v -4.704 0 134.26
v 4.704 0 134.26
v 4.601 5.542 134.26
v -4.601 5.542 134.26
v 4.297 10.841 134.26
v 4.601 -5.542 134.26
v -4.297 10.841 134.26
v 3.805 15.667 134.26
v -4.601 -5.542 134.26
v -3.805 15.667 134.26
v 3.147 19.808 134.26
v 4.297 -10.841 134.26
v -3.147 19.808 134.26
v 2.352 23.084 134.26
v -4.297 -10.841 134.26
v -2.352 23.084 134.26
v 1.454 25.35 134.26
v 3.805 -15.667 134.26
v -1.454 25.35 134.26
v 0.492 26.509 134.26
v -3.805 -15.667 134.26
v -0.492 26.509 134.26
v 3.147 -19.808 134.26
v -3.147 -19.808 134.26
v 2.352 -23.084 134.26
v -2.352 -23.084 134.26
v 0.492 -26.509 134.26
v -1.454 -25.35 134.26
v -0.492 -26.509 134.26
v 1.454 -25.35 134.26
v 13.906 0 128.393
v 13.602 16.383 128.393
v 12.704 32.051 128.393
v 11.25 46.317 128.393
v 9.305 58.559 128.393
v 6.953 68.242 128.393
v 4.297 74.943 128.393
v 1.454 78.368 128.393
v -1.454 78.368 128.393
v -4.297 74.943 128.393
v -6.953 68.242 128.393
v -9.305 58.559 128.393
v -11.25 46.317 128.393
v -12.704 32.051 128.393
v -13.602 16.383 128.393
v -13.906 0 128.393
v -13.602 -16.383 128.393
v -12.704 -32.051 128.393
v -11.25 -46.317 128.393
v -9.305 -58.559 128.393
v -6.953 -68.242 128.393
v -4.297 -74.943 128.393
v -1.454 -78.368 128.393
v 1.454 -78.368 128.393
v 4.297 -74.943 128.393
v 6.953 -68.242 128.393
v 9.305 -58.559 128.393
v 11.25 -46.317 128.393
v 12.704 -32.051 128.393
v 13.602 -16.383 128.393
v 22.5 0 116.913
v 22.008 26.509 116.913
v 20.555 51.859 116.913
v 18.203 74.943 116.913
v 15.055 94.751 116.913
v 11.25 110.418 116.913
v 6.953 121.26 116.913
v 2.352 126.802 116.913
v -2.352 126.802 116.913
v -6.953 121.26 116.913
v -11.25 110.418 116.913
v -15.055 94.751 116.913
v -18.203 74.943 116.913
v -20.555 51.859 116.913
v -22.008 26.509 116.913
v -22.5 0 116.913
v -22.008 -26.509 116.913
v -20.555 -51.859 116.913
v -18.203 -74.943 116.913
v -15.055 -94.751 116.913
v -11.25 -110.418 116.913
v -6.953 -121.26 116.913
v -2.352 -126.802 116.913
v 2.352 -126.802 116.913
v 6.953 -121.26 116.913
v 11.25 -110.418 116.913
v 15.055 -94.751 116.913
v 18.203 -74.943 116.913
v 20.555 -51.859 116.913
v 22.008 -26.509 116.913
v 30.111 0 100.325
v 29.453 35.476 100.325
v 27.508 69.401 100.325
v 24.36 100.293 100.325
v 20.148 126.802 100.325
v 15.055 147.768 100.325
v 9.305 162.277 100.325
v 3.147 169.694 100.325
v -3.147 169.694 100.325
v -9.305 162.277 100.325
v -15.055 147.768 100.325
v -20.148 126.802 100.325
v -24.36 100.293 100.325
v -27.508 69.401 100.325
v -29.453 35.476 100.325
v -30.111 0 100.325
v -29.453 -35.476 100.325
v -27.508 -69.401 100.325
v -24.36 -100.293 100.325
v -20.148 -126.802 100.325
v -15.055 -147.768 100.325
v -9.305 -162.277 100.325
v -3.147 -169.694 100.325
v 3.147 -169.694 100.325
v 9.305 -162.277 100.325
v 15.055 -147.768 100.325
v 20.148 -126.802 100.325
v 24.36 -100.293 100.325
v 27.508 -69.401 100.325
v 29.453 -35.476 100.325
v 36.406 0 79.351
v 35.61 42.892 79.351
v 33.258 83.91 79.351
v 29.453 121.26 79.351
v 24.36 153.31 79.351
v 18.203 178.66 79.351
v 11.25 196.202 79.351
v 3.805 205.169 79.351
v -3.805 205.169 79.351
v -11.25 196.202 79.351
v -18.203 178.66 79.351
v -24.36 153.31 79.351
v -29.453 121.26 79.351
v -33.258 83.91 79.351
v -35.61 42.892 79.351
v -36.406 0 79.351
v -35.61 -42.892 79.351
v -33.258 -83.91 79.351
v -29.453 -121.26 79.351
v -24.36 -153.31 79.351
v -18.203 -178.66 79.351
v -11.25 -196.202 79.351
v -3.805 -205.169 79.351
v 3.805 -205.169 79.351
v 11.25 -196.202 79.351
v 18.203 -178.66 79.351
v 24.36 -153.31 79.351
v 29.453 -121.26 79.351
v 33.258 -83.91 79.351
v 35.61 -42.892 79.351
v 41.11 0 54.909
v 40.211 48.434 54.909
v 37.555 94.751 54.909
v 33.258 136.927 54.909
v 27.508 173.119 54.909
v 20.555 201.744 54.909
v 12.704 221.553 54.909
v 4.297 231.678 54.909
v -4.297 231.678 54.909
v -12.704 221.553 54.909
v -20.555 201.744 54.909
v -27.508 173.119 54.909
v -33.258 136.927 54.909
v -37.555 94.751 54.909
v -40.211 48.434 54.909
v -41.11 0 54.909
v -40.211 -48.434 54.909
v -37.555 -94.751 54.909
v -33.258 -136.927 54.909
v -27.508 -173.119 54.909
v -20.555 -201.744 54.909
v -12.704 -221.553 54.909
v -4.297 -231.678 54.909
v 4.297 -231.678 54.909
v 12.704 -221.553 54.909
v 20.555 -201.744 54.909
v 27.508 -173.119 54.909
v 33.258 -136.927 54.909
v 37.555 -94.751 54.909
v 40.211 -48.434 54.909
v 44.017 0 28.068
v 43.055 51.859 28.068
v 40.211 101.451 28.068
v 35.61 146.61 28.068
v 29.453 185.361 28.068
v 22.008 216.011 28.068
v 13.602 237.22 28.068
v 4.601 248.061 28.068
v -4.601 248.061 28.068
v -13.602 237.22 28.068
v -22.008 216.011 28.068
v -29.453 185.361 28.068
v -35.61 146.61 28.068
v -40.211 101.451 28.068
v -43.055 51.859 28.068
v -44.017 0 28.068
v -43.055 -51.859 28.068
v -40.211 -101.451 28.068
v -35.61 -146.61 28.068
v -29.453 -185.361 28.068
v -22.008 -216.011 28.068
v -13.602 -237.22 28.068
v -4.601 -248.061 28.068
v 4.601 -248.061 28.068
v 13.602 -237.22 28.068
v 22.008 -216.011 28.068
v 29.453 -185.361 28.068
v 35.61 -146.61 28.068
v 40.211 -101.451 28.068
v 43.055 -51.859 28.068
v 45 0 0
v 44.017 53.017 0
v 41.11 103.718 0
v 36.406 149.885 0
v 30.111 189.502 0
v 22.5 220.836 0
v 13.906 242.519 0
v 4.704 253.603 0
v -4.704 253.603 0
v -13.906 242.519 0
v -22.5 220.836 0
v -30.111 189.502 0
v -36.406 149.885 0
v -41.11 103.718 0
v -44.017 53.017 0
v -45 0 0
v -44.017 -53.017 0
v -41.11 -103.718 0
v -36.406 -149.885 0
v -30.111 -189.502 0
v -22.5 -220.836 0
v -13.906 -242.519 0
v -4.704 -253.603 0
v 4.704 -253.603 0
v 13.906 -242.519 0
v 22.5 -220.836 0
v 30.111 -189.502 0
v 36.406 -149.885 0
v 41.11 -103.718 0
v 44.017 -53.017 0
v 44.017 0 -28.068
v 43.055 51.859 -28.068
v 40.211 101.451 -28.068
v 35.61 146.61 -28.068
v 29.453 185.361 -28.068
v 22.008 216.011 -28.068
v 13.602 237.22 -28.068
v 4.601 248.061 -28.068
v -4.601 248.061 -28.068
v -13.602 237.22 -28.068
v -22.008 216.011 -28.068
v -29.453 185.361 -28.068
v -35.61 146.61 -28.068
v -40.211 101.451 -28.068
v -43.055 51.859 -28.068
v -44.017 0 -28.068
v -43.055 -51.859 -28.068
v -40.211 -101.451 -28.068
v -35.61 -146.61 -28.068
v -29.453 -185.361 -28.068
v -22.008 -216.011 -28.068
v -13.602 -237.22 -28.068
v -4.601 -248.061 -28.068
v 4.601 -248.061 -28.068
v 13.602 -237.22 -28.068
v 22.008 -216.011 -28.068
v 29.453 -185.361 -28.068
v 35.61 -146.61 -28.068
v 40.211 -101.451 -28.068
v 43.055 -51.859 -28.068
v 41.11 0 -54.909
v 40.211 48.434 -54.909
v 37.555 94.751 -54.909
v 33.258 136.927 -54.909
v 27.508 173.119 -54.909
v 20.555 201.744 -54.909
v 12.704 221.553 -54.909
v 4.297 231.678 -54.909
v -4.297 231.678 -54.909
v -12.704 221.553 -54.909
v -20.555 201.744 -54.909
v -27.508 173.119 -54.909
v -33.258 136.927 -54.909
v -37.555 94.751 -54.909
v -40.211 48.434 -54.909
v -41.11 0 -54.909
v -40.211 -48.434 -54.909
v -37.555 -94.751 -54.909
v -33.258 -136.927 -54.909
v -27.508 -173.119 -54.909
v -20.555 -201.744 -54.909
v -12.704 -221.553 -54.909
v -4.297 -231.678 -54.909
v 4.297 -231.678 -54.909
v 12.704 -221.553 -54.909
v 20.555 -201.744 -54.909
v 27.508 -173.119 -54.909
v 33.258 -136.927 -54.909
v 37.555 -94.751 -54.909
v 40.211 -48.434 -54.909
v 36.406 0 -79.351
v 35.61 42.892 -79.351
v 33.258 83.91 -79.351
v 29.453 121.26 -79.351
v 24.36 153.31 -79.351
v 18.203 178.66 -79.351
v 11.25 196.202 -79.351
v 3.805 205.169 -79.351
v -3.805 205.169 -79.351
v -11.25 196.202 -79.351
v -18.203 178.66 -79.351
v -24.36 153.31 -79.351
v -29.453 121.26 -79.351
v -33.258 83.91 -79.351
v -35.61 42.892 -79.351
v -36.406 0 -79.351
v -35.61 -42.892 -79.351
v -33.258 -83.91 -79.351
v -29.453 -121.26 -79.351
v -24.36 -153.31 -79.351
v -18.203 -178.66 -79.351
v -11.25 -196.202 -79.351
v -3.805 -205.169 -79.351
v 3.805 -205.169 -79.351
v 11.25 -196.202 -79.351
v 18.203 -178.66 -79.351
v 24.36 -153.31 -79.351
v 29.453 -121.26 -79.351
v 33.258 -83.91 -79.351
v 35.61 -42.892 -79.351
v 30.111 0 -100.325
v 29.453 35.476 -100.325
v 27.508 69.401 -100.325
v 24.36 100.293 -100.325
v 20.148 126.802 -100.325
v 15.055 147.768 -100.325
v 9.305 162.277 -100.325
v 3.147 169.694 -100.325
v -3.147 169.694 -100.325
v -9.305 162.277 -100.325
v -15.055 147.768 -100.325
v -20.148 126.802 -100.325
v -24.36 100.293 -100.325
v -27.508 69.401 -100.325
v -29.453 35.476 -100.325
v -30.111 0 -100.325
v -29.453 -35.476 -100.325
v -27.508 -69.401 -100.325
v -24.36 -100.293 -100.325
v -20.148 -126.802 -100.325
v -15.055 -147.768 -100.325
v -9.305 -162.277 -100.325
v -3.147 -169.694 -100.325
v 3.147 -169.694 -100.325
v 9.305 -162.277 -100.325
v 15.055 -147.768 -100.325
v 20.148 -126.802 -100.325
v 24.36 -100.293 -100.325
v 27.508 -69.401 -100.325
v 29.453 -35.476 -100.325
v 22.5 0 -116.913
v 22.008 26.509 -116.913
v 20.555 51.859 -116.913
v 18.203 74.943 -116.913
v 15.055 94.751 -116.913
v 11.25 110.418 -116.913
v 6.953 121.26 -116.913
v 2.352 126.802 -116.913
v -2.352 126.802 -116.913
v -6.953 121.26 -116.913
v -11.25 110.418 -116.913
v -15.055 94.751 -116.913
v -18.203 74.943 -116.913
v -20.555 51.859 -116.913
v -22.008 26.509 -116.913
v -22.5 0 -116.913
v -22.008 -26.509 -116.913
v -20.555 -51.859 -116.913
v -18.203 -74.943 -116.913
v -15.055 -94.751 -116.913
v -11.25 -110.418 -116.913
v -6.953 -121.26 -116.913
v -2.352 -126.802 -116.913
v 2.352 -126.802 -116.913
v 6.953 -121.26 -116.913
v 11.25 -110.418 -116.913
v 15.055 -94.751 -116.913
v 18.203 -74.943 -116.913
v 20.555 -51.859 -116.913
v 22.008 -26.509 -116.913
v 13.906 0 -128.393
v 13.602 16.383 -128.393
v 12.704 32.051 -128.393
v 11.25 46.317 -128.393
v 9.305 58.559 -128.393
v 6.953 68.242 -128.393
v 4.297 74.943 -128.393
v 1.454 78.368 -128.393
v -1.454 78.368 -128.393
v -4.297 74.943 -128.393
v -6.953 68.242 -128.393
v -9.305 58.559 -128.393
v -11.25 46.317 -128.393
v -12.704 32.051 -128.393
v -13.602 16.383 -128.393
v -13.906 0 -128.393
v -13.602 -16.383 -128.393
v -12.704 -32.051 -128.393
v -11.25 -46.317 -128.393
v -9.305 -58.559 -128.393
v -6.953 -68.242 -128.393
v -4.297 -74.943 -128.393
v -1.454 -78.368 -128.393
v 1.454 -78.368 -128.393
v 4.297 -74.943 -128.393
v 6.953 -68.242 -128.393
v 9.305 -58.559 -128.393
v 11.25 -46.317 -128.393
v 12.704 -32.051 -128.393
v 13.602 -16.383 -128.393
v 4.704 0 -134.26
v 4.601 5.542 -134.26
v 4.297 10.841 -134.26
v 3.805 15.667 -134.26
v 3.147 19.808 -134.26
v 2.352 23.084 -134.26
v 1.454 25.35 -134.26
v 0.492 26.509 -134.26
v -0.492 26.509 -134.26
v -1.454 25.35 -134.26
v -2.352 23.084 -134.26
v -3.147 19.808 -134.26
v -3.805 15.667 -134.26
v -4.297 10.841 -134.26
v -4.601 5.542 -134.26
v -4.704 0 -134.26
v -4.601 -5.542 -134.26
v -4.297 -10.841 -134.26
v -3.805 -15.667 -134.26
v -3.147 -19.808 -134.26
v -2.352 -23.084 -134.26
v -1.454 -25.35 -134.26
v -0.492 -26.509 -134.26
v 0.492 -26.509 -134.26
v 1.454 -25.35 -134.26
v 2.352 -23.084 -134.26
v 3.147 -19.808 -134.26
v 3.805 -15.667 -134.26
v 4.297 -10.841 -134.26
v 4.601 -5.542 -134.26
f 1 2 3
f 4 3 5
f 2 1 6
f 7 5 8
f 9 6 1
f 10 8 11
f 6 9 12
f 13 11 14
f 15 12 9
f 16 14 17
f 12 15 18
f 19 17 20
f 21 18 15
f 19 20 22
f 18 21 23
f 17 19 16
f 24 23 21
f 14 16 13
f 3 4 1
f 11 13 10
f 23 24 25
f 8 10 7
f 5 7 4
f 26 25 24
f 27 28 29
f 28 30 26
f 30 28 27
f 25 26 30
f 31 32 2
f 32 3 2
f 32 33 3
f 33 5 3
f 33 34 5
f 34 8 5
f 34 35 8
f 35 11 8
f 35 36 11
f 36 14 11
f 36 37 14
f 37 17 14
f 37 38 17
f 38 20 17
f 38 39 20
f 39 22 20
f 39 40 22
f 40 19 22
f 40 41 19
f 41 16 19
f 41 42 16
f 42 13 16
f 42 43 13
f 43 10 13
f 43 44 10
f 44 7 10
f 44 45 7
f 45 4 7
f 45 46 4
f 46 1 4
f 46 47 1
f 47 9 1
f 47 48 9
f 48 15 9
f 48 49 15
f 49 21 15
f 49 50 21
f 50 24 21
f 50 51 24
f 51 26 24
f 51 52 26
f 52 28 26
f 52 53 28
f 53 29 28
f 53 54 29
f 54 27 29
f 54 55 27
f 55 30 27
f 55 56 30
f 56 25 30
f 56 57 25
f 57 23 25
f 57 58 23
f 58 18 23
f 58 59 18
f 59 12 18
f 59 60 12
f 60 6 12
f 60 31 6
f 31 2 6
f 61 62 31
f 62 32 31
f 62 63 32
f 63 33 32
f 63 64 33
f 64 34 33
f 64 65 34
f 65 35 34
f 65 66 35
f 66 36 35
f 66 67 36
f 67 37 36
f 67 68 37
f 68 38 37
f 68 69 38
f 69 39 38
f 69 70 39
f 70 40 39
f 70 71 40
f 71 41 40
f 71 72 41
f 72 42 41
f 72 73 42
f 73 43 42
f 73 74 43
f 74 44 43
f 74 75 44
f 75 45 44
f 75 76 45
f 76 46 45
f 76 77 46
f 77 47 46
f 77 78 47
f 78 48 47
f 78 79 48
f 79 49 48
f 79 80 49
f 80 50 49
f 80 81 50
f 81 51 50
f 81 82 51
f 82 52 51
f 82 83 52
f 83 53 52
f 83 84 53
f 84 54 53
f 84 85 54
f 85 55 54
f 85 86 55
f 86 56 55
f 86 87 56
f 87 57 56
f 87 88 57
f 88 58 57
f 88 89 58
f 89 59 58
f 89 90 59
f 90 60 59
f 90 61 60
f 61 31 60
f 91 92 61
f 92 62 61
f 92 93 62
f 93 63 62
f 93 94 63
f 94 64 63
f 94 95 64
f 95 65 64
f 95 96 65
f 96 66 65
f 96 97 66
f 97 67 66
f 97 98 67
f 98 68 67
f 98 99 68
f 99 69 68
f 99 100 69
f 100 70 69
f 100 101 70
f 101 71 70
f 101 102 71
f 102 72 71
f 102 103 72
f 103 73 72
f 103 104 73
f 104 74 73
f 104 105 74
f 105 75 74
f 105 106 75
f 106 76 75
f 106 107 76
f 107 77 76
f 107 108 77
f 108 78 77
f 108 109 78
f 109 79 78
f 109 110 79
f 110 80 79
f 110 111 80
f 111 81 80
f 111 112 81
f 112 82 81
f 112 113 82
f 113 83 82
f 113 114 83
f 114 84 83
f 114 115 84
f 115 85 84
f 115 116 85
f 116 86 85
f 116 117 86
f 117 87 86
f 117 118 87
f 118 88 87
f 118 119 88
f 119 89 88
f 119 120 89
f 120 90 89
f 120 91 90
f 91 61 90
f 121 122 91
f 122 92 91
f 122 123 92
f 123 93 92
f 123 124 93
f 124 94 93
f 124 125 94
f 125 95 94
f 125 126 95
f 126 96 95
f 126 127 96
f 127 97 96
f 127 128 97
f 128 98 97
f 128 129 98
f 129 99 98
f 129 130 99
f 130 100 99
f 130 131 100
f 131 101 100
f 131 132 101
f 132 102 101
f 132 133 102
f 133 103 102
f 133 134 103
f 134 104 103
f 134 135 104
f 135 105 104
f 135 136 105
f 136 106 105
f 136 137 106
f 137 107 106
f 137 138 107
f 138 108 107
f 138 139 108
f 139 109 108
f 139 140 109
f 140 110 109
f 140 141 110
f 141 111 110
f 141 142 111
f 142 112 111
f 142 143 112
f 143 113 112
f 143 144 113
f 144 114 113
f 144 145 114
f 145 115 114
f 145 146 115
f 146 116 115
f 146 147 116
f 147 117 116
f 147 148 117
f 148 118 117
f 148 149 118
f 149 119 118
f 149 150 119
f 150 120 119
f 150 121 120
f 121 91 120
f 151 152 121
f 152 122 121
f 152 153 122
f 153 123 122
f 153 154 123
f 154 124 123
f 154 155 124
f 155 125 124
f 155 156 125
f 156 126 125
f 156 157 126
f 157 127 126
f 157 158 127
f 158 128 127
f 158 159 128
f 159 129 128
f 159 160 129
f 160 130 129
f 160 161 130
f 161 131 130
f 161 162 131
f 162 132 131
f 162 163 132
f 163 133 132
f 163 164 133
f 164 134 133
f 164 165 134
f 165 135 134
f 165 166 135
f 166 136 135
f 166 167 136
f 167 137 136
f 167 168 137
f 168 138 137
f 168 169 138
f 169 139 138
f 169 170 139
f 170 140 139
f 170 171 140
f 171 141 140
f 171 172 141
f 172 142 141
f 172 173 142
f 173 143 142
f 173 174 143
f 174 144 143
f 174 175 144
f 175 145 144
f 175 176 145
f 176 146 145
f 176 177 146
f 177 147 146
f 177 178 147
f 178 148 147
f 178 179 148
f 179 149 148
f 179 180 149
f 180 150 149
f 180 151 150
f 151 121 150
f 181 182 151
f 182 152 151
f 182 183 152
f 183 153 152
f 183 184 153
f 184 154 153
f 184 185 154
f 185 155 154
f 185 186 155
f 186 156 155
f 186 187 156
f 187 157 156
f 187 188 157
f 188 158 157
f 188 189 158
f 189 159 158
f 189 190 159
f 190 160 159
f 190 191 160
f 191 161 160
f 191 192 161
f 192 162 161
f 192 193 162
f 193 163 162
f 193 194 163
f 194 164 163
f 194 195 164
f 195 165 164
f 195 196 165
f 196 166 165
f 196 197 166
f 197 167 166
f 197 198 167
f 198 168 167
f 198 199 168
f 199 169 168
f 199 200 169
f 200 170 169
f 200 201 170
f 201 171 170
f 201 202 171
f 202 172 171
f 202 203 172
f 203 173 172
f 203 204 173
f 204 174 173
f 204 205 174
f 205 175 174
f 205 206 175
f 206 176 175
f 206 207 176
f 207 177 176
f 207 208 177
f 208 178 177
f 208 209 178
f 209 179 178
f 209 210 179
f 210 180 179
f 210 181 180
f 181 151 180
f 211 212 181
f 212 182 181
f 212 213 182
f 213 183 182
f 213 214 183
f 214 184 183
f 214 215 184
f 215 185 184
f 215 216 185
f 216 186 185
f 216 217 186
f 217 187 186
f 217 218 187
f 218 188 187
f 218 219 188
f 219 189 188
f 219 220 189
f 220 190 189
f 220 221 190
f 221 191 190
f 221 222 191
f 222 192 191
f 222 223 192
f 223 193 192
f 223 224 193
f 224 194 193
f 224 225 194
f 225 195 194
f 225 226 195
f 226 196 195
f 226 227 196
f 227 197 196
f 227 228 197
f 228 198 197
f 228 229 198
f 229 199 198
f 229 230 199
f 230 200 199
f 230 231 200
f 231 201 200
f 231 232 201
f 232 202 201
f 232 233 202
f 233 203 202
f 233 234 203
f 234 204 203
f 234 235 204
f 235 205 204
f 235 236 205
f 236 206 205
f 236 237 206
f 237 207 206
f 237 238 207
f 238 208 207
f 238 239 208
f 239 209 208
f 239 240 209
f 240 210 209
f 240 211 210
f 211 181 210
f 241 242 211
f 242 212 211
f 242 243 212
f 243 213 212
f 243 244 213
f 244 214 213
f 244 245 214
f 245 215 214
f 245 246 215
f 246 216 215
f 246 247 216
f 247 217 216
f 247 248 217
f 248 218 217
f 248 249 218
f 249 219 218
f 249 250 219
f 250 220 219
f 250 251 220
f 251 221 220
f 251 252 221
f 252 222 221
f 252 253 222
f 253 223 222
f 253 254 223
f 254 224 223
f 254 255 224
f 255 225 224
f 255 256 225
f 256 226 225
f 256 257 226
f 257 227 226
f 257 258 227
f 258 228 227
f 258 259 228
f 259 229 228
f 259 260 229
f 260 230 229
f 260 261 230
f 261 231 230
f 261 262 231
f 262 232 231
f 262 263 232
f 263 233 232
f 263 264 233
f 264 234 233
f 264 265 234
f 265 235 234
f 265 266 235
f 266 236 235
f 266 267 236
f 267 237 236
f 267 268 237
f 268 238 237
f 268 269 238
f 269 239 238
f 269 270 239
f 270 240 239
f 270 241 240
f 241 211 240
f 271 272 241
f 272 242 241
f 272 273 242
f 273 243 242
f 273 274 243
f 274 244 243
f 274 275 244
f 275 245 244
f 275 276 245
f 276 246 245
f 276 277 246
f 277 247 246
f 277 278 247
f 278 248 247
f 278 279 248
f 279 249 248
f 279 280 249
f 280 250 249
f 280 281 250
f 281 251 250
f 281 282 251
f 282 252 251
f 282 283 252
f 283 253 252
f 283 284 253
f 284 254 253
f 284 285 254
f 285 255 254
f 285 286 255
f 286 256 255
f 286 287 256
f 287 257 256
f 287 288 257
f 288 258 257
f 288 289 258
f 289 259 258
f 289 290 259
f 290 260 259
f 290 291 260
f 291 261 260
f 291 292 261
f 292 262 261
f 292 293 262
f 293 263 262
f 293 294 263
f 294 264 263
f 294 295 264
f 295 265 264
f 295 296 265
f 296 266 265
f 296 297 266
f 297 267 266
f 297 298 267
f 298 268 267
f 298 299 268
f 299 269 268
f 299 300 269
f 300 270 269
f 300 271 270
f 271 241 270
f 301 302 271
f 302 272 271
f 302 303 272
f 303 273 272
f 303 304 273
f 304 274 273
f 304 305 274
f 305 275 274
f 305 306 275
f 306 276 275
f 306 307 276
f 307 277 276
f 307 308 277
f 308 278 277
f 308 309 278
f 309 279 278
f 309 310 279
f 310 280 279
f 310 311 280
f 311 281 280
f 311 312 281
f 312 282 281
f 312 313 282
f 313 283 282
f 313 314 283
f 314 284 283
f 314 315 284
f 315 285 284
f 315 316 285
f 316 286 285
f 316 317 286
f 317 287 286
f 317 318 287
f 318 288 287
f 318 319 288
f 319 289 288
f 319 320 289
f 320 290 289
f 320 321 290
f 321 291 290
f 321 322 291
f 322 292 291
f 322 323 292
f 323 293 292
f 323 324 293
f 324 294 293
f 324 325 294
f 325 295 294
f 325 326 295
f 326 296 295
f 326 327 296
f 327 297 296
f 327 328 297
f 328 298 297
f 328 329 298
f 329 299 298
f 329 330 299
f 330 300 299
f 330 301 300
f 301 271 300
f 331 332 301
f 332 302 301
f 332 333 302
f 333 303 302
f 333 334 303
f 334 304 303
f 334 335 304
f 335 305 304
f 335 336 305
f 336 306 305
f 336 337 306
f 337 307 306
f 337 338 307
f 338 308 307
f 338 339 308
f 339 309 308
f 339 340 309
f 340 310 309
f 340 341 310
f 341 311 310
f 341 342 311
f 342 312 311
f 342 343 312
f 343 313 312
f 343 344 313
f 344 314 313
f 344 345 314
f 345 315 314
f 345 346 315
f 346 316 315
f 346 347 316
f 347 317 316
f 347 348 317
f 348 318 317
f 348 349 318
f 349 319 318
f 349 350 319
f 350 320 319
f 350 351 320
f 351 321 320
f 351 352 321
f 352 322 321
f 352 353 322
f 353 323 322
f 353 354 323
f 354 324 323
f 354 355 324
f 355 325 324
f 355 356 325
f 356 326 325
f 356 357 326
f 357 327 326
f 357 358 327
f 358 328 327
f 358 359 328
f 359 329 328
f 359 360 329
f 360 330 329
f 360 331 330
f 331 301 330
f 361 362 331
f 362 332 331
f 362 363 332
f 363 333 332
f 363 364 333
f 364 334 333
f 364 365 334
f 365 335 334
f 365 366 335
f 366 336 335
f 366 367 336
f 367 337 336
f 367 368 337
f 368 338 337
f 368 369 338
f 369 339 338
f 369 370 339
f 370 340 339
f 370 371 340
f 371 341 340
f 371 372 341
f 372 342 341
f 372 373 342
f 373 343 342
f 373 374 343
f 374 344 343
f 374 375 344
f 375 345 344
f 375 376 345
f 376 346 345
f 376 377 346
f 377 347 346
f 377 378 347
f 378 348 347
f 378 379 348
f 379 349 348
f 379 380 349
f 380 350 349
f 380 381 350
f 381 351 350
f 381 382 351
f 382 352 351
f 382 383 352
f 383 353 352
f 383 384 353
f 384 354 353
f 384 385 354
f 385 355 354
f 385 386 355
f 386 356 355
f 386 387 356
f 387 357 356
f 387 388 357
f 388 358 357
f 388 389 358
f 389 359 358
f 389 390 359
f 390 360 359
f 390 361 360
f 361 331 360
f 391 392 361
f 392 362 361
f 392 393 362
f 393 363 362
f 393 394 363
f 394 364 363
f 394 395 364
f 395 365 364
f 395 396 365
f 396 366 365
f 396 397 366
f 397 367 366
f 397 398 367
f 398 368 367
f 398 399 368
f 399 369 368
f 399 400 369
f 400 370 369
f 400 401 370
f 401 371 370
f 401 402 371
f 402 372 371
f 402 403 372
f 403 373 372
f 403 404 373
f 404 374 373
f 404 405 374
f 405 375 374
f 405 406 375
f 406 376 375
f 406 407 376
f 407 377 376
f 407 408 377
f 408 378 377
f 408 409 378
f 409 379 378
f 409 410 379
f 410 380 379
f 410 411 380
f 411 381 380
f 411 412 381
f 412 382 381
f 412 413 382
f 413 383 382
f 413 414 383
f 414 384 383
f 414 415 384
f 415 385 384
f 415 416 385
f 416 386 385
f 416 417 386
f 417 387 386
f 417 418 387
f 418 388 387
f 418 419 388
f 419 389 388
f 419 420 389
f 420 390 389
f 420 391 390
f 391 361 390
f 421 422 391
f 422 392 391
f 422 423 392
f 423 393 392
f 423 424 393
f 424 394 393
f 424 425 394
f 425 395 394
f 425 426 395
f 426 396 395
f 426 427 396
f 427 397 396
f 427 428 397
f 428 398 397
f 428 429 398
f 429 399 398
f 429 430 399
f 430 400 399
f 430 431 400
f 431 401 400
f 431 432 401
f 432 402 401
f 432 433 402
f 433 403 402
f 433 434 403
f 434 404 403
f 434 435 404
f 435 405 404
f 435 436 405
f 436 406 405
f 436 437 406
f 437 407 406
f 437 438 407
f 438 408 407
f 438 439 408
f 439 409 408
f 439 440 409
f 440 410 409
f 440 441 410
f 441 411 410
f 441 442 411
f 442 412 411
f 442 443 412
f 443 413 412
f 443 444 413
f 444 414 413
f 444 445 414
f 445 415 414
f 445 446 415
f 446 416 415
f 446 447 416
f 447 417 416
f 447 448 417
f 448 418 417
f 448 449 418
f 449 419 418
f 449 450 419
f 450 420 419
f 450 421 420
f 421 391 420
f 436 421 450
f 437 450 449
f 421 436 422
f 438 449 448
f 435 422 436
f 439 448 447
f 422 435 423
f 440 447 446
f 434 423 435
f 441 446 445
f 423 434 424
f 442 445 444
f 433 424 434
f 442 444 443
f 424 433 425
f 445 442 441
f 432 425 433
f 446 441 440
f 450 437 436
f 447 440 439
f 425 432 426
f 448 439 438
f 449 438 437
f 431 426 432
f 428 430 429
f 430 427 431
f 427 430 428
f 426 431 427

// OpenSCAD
// Generated by SolidPython 1.0.1 on 2020-07-29 00:46:46


scale(v = [3, 17, 9]) {
	sphere(r = 15);
}
/***********************************************
*********      SolidPython code:      **********
************************************************
 
# import packages: SolidPython
from solid import *
from solid.utils import *
from itertools import chain, combinations, permutations


class Resize:

    def __init__(self, scad_file):
        self.scad_file = scad_file
        #self.scad_file = import_scad(scad_file)
        # cone/cylinder param:
        self.r1 = 0
        self.r2 = 0
        self.h = 0
        # rectangular prism param:
        self.w = 0
        self.l = 0
        # ellipse param:
        self.r = 0

    # import OpenScad code (file name corresponds to shape)


    # classify shape + parameters
    def assign(self, param1, param2, param3):
        if self.scad_file == 'cone.scad':
            self.r1 = param1
            self.r2 = param2
            self.h = param3
        elif self.scad_file == 'cylinder.scad':
            self.r1 = param1
            self.r2 = param2
            self.h = param3
        elif self.scad_file == 'rectangularPrism.scad':
            self.h = param1
            self.l = param2
            self.w = param3
        else:
            self.r = param1
            self.h = param2

    # resize parameters
    def iterate(self):
        x = range(3, 20, 2)
        i = 1
        if self.scad_file == 'cone.scad':
            tempList = list(permutations(x, 2))
            for temp in tempList:
                param1 = temp[0]
                param2 = temp[1]
                filepath = 'produced_scad_files/' + 'cone' + str(param1) + '_' + str(param2) + '_' + '.scad'
                scad_render_to_file(cylinder(h=param1, r1=param2, r2=0), filepath)

        elif self.scad_file == 'cylinder.scad':
            tempList = list(permutations(x, 3))
            for temp in tempList:
                param1 = temp[0]
                param2 = temp[1]
                filepath = 'produced_scad_files/' + 'cylinder' + str(param1) + '_' + str(param2) + '_' + '.scad'
                scad_render_to_file(cylinder(h=param1, r1=param2, r2=param2), filepath)

        elif self.scad_file == 'rectangularPrism.scad':
            tempList = list(permutations(x, 3))
            for temp in tempList:
                param1 = temp[0]
                param2 = temp[1]
                param3 = temp[2]
                filepath = 'produced_scad_files/' + 'rectangularPrism' + str(param1) + '_' + str(param2) + '_' + str(
                    param3) + '.scad'
                scad_render_to_file(cube(size=(param1, param2, param3)), filepath)

        elif self.scad_file == 'ellipse.scad':
            tempList = list(permutations(x, 4))
            for temp in tempList:
                param1 = temp[0]
                param2 = temp[1]
                param3 = temp[2]
                param4 = temp[3]
                filepath = 'produced_scad_files/' + 'ellipse' + str(param1) + '_' + str(param2) + '_' + str(param3) + '_' + str(param4) + '.scad'
                scad_render_to_file(scale([param1, param2, param3])(sphere(r=param4)), filepath)

    def render_to_scadfile(self):
        scad_render_to_file(scad, 'example.scad') 
 
************************************************/
